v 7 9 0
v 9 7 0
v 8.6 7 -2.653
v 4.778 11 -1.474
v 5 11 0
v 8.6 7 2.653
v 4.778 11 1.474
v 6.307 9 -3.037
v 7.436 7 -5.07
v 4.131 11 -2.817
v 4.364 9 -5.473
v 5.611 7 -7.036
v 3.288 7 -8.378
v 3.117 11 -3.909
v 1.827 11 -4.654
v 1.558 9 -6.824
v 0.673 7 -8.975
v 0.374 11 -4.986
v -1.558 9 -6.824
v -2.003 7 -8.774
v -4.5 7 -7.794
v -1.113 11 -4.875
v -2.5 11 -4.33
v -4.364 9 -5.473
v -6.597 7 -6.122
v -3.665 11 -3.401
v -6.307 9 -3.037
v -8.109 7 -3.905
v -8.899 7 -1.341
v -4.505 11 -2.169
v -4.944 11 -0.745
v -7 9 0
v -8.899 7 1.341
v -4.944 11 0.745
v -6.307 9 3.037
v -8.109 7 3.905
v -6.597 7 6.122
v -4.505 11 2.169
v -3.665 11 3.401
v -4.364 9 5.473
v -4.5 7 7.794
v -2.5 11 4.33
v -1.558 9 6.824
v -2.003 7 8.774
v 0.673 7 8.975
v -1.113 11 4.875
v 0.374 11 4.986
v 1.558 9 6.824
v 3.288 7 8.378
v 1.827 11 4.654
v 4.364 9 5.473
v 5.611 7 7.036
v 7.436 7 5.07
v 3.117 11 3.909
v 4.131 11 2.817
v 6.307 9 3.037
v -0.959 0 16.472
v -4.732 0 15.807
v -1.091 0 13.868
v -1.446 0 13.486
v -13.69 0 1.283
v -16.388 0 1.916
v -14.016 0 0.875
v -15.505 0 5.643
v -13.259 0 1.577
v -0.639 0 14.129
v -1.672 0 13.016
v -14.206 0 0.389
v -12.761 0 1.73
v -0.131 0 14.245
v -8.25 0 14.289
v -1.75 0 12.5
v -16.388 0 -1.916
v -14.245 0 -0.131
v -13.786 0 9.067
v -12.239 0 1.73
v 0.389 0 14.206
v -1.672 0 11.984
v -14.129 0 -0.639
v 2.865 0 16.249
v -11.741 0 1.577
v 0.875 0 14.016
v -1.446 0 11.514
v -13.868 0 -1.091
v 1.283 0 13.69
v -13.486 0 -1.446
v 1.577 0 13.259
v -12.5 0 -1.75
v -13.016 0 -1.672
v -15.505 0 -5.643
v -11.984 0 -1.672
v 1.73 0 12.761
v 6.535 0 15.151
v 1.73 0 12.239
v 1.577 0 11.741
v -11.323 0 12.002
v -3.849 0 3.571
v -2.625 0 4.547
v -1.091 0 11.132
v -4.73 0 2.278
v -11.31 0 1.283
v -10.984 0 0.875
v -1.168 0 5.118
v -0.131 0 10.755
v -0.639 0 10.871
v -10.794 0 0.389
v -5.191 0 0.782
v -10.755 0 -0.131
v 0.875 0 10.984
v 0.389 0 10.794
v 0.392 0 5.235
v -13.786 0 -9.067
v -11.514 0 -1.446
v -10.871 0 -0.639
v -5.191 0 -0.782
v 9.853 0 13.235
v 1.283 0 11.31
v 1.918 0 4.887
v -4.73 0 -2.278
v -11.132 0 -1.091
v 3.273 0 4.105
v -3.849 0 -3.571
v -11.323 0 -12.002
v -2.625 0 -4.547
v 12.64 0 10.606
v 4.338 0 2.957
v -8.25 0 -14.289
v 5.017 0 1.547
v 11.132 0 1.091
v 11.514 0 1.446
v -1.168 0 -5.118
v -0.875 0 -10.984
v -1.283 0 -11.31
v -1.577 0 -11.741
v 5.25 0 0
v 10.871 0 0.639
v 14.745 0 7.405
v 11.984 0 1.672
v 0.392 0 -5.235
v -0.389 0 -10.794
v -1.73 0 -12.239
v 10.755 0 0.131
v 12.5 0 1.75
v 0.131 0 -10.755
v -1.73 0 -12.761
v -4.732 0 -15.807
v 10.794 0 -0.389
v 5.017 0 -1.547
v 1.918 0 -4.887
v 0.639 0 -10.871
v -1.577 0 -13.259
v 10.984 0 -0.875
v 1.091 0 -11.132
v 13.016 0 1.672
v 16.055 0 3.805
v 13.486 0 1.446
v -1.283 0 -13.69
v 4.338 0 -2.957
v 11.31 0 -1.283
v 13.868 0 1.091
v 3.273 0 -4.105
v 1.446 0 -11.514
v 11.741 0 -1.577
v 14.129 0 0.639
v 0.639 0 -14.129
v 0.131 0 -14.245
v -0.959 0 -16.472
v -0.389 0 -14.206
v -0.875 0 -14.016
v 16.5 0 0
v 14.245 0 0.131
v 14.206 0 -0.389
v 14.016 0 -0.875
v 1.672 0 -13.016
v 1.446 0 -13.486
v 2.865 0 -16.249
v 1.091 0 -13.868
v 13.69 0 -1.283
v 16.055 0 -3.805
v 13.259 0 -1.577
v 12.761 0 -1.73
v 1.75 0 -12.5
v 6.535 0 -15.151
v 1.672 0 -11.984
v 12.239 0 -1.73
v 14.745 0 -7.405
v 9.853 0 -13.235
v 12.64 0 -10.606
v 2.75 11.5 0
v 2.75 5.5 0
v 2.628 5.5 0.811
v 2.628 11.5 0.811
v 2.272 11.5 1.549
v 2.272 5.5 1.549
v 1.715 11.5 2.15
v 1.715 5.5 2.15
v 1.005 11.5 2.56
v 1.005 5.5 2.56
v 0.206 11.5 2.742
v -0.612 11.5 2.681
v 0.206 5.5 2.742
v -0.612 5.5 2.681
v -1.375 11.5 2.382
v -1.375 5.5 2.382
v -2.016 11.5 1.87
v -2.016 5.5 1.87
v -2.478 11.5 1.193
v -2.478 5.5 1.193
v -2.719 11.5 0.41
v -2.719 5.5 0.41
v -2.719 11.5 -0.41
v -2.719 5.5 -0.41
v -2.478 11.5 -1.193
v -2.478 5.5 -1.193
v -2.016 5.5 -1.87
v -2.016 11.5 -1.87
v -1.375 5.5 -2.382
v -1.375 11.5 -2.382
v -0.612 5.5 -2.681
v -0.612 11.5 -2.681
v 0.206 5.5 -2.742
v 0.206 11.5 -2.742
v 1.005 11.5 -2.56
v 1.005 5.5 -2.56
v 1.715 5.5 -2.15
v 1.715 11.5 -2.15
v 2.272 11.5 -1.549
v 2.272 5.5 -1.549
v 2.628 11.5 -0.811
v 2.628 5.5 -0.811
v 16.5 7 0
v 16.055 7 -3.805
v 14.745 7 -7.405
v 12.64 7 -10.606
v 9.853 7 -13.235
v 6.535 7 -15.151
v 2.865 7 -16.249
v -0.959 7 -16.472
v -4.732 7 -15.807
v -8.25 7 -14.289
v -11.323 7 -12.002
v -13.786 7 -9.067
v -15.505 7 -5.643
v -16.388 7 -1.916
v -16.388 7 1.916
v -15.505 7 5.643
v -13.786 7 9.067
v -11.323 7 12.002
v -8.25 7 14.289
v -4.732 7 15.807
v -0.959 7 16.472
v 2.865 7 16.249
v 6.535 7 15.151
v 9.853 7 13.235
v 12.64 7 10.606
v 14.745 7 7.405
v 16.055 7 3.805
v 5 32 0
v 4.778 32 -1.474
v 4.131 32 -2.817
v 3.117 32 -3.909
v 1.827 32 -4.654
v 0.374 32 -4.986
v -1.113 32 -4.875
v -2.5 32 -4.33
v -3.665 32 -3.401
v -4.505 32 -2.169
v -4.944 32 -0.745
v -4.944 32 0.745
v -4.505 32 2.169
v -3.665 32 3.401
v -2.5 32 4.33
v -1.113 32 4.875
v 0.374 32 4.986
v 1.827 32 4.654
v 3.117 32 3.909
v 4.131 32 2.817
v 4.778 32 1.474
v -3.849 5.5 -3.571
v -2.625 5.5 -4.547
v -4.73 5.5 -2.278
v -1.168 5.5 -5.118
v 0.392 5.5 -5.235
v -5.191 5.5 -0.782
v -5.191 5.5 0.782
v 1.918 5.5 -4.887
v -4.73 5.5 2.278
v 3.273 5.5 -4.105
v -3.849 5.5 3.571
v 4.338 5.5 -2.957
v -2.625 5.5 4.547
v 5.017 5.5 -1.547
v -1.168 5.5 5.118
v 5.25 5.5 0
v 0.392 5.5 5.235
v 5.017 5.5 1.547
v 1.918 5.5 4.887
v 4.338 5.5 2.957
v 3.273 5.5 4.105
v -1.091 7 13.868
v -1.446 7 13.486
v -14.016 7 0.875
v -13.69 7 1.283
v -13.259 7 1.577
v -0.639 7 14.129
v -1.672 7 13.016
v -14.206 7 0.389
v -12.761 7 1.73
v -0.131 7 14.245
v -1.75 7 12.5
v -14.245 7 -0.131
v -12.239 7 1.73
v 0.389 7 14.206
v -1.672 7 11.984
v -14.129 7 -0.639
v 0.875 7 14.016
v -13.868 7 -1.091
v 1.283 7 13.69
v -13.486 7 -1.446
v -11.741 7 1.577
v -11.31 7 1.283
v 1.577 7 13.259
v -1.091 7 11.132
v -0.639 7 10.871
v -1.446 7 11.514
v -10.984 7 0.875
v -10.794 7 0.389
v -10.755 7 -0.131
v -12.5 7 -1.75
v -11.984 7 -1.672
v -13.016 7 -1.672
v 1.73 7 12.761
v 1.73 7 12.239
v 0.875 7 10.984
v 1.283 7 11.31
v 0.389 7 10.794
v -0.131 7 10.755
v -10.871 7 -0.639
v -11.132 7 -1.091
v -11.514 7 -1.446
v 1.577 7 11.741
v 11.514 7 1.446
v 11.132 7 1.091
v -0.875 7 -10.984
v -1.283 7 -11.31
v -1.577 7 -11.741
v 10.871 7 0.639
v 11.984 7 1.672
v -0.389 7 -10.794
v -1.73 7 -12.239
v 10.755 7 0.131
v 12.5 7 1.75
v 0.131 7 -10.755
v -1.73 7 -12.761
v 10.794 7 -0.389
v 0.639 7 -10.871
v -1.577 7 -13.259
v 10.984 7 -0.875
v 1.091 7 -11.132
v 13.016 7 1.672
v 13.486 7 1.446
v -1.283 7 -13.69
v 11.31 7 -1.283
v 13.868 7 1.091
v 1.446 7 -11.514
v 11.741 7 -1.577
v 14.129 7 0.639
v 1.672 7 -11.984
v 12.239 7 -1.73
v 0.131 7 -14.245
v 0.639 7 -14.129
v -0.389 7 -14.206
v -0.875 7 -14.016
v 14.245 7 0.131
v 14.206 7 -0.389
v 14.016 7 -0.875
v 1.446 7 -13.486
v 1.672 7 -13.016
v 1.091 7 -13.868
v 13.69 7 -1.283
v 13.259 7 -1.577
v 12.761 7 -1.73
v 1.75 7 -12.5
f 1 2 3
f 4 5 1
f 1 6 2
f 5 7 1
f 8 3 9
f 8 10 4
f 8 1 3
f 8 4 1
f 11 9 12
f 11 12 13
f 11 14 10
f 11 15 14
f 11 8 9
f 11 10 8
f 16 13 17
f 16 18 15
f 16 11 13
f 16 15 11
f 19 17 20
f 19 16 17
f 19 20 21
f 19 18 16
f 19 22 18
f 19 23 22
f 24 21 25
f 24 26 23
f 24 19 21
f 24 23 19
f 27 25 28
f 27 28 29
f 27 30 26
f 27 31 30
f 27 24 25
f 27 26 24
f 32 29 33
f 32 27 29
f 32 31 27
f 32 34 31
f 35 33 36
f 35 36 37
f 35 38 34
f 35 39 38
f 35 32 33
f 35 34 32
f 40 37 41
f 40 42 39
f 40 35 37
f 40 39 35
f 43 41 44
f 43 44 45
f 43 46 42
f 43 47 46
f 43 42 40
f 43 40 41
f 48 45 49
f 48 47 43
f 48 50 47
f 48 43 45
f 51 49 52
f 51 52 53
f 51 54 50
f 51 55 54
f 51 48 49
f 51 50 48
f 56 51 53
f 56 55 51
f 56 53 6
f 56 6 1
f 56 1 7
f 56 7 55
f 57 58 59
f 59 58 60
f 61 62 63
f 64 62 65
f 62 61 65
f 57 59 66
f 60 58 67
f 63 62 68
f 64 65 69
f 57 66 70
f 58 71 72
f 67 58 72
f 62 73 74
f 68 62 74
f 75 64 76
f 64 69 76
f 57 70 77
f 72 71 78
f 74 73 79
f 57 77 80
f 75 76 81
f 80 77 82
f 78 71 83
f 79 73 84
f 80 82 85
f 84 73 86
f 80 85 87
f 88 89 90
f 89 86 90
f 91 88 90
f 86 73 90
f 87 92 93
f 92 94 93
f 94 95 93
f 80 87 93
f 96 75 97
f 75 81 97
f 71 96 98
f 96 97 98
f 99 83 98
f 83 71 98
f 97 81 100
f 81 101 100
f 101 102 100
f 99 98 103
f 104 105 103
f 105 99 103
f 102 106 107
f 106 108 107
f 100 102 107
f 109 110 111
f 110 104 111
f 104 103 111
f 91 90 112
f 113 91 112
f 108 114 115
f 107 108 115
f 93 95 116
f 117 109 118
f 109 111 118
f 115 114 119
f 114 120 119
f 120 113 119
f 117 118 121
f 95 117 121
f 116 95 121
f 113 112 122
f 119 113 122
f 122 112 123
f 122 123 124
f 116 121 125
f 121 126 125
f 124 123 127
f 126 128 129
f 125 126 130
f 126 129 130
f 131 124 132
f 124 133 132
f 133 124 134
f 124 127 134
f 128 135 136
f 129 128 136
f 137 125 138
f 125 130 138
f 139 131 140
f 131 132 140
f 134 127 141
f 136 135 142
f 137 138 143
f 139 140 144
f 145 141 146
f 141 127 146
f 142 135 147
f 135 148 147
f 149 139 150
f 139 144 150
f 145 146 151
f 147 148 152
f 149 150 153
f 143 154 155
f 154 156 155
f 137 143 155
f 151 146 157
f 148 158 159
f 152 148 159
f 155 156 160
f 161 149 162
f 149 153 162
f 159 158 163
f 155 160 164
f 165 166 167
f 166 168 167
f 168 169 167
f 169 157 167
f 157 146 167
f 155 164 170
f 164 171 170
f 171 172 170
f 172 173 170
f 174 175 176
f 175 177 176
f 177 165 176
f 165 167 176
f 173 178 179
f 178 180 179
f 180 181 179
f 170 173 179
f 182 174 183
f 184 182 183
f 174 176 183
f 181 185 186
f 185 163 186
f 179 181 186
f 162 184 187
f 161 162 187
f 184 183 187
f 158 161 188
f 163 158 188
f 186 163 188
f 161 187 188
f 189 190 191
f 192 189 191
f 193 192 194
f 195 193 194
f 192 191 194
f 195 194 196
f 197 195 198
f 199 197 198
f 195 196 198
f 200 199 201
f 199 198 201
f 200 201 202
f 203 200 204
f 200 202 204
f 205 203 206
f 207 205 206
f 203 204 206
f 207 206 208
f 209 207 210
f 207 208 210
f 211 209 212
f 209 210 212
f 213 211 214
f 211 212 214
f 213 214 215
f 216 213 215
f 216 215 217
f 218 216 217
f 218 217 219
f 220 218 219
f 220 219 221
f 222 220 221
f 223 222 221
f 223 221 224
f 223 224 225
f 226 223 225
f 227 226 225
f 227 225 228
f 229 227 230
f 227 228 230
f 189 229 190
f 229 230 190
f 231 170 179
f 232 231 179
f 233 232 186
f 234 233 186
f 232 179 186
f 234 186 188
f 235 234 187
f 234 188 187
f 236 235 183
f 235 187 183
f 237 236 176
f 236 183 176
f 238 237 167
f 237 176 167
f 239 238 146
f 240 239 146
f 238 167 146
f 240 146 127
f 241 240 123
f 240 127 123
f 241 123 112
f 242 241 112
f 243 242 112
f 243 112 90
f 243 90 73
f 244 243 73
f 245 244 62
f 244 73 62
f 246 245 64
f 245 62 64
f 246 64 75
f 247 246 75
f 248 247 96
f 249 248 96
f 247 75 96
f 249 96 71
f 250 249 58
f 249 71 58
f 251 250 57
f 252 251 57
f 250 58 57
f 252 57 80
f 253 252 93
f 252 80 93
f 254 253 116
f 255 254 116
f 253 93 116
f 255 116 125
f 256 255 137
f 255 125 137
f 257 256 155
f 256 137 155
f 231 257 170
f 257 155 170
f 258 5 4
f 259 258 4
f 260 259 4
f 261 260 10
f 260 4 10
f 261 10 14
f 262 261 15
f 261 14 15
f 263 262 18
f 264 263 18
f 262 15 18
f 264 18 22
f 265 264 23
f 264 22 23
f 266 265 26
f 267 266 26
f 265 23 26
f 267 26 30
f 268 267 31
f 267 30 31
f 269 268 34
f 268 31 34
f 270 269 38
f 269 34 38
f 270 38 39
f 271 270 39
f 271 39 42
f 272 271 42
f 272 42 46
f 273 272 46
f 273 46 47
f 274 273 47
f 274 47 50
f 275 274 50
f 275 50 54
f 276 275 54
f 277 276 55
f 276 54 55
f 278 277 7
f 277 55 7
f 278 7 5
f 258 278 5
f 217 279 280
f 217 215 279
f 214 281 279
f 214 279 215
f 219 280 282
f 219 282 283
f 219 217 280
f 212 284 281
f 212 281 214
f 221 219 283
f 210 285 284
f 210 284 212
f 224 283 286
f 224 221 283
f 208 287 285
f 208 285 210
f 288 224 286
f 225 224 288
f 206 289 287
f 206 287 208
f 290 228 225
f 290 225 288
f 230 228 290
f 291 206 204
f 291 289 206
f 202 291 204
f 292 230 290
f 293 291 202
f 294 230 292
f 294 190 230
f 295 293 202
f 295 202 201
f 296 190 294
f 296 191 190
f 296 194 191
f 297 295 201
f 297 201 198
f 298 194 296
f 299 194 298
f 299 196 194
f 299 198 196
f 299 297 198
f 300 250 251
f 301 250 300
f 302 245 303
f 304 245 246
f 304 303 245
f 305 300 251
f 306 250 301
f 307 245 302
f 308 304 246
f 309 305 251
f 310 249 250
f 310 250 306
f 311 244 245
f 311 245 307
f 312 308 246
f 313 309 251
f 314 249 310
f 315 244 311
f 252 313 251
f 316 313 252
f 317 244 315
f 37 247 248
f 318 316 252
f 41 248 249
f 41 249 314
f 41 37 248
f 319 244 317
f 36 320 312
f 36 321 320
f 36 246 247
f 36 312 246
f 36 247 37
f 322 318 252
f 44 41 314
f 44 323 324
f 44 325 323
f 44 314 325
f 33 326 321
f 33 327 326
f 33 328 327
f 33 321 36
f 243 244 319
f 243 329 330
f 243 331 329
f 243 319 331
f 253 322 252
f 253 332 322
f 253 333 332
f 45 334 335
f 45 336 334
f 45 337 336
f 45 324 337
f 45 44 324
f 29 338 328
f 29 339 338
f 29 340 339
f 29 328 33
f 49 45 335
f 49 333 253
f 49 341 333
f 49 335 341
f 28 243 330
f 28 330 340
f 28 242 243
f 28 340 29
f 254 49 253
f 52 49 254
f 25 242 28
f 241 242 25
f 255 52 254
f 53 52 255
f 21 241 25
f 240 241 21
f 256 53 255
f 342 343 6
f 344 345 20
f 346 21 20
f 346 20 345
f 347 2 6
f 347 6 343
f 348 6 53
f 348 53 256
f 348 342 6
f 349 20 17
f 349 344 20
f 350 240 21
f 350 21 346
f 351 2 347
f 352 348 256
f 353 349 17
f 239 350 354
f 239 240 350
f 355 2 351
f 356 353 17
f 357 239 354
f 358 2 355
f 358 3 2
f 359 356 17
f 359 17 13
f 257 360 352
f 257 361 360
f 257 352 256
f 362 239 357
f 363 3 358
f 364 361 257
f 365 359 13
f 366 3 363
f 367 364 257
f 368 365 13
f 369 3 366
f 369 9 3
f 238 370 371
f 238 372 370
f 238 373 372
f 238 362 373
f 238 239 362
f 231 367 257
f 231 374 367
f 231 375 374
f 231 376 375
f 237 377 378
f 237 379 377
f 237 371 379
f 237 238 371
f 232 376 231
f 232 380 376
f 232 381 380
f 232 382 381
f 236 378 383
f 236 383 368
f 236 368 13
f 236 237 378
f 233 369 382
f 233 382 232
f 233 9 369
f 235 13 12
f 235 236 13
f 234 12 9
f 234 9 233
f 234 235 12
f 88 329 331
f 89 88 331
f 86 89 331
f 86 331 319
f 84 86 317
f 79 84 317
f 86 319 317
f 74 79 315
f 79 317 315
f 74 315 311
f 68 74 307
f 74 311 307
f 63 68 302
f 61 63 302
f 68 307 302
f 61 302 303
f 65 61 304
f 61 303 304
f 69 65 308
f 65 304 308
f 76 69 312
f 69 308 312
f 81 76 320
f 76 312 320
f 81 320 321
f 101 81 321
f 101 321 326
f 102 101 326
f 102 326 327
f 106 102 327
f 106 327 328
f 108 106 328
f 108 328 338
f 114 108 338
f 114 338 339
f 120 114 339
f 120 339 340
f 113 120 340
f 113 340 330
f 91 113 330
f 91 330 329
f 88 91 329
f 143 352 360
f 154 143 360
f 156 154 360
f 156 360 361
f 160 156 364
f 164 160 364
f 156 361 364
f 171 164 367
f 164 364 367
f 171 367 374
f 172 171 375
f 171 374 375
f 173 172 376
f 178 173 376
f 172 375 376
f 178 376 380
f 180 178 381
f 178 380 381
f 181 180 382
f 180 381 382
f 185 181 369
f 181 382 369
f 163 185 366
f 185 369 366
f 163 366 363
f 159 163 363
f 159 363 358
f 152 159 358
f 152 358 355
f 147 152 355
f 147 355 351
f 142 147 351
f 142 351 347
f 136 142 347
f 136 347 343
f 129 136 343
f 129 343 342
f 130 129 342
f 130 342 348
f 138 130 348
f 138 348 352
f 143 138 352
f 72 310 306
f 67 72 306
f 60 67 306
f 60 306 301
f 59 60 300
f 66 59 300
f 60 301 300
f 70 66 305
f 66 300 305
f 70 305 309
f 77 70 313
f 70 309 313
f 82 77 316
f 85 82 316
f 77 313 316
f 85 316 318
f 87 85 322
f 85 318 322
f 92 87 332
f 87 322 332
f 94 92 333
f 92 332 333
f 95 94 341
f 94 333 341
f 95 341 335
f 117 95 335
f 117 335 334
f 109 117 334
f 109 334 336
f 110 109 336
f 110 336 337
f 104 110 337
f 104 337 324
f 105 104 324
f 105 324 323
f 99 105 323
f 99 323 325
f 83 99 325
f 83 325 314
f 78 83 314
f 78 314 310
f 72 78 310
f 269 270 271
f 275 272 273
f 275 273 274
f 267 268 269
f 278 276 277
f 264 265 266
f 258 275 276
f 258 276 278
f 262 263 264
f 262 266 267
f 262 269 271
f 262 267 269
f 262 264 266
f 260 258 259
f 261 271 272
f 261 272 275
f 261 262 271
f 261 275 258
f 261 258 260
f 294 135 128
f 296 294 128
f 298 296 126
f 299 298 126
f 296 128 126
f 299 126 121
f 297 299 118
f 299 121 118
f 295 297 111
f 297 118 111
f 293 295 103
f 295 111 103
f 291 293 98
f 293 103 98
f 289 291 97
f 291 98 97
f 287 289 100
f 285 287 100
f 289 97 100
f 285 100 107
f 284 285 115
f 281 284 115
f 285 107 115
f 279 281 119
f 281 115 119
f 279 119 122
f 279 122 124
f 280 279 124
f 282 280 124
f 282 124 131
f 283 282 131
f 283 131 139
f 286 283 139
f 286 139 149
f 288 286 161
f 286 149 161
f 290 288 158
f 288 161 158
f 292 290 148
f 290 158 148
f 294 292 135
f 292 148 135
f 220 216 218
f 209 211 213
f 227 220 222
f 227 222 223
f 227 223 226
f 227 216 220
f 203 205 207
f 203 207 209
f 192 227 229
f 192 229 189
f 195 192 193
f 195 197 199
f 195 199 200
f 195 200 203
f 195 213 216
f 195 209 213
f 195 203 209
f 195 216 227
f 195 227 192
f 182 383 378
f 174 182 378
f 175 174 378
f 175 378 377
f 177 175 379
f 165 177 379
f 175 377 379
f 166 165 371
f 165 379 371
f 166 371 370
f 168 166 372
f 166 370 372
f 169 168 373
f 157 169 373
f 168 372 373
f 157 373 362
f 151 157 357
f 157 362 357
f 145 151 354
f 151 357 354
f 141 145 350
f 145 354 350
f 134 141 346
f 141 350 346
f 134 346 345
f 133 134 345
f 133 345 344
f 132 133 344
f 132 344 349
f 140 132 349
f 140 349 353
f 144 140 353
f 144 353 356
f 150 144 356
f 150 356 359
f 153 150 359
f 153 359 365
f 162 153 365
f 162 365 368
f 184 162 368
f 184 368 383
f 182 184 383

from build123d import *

# Parameters (mm, degrees)
SKETCH1_R           = 16.5
BOSS_EXTRUDE1_DEPTH = 7
SKETCH2_R           = 1.75
CUT_EXTRUDE1_DEPTH  = 8
CIRPATTERN1_COUNT   = 4
SKETCH3_R           = 5
BOSS_EXTRUDE2_DEPTH = 25
CHAMFER1_SIZE       = 4
SKETCH6_R           = 5.25
CUT_EXTRUDE4_DEPTH  = 5.5
SKETCH8_R           = 2.75
CUT_EXTRUDE5_DEPTH  = 6


with BuildPart() as part:
    # Sketch1 → Boss-Extrude1 (new body)
    with BuildSketch(Plane(origin=(0, 0, 0), x_dir=(1, 0, 0), z_dir=(0, 1, 0))):
        Circle(SKETCH1_R)
    extrude(amount=BOSS_EXTRUDE1_DEPTH)

    # Sketch2 → Cut-Extrude1 (cut, through all)
    with BuildSketch(Plane(origin=(0, 7, 0), x_dir=(1, 0, 0), z_dir=(0, 1, 0))):
        with Locations((0, 12.5)):
            Circle(SKETCH2_R)
    cut_extrude1 = extrude(amount=-CUT_EXTRUDE1_DEPTH, mode=Mode.SUBTRACT)

    # CirPattern1: Cut-Extrude1 ×4 about axis
    cirpattern1_axis = Axis((0, 0, 0), (0, 1, 0))
    for i in range(1, CIRPATTERN1_COUNT):
        add(cut_extrude1.rotate(cirpattern1_axis, i * 360 / CIRPATTERN1_COUNT), mode=Mode.SUBTRACT)

    # Sketch3 → Boss-Extrude2 (add)
    with BuildSketch(Plane(origin=(0, 7, 0), x_dir=(1, 0, 0), z_dir=(0, 1, 0))):
        Circle(SKETCH3_R)
    extrude(amount=BOSS_EXTRUDE2_DEPTH)

    # Chamfer1
    chamfer1_edges = [part.edges().sort_by_distance(p)[0] for p in [
        (-5, 7, 0),
    ]]
    chamfer(chamfer1_edges, length=CHAMFER1_SIZE)

    # Sketch6 → Cut-Extrude4 (cut)
    with BuildSketch(Plane.XZ):
        Circle(SKETCH6_R)
    extrude(amount=-CUT_EXTRUDE4_DEPTH, mode=Mode.SUBTRACT)

    # Sketch8 → Cut-Extrude5 (cut)
    with BuildSketch(Plane.XZ.offset(-5.5)):
        Circle(SKETCH8_R)
    extrude(amount=-CUT_EXTRUDE5_DEPTH, mode=Mode.SUBTRACT)


solid = part.part
